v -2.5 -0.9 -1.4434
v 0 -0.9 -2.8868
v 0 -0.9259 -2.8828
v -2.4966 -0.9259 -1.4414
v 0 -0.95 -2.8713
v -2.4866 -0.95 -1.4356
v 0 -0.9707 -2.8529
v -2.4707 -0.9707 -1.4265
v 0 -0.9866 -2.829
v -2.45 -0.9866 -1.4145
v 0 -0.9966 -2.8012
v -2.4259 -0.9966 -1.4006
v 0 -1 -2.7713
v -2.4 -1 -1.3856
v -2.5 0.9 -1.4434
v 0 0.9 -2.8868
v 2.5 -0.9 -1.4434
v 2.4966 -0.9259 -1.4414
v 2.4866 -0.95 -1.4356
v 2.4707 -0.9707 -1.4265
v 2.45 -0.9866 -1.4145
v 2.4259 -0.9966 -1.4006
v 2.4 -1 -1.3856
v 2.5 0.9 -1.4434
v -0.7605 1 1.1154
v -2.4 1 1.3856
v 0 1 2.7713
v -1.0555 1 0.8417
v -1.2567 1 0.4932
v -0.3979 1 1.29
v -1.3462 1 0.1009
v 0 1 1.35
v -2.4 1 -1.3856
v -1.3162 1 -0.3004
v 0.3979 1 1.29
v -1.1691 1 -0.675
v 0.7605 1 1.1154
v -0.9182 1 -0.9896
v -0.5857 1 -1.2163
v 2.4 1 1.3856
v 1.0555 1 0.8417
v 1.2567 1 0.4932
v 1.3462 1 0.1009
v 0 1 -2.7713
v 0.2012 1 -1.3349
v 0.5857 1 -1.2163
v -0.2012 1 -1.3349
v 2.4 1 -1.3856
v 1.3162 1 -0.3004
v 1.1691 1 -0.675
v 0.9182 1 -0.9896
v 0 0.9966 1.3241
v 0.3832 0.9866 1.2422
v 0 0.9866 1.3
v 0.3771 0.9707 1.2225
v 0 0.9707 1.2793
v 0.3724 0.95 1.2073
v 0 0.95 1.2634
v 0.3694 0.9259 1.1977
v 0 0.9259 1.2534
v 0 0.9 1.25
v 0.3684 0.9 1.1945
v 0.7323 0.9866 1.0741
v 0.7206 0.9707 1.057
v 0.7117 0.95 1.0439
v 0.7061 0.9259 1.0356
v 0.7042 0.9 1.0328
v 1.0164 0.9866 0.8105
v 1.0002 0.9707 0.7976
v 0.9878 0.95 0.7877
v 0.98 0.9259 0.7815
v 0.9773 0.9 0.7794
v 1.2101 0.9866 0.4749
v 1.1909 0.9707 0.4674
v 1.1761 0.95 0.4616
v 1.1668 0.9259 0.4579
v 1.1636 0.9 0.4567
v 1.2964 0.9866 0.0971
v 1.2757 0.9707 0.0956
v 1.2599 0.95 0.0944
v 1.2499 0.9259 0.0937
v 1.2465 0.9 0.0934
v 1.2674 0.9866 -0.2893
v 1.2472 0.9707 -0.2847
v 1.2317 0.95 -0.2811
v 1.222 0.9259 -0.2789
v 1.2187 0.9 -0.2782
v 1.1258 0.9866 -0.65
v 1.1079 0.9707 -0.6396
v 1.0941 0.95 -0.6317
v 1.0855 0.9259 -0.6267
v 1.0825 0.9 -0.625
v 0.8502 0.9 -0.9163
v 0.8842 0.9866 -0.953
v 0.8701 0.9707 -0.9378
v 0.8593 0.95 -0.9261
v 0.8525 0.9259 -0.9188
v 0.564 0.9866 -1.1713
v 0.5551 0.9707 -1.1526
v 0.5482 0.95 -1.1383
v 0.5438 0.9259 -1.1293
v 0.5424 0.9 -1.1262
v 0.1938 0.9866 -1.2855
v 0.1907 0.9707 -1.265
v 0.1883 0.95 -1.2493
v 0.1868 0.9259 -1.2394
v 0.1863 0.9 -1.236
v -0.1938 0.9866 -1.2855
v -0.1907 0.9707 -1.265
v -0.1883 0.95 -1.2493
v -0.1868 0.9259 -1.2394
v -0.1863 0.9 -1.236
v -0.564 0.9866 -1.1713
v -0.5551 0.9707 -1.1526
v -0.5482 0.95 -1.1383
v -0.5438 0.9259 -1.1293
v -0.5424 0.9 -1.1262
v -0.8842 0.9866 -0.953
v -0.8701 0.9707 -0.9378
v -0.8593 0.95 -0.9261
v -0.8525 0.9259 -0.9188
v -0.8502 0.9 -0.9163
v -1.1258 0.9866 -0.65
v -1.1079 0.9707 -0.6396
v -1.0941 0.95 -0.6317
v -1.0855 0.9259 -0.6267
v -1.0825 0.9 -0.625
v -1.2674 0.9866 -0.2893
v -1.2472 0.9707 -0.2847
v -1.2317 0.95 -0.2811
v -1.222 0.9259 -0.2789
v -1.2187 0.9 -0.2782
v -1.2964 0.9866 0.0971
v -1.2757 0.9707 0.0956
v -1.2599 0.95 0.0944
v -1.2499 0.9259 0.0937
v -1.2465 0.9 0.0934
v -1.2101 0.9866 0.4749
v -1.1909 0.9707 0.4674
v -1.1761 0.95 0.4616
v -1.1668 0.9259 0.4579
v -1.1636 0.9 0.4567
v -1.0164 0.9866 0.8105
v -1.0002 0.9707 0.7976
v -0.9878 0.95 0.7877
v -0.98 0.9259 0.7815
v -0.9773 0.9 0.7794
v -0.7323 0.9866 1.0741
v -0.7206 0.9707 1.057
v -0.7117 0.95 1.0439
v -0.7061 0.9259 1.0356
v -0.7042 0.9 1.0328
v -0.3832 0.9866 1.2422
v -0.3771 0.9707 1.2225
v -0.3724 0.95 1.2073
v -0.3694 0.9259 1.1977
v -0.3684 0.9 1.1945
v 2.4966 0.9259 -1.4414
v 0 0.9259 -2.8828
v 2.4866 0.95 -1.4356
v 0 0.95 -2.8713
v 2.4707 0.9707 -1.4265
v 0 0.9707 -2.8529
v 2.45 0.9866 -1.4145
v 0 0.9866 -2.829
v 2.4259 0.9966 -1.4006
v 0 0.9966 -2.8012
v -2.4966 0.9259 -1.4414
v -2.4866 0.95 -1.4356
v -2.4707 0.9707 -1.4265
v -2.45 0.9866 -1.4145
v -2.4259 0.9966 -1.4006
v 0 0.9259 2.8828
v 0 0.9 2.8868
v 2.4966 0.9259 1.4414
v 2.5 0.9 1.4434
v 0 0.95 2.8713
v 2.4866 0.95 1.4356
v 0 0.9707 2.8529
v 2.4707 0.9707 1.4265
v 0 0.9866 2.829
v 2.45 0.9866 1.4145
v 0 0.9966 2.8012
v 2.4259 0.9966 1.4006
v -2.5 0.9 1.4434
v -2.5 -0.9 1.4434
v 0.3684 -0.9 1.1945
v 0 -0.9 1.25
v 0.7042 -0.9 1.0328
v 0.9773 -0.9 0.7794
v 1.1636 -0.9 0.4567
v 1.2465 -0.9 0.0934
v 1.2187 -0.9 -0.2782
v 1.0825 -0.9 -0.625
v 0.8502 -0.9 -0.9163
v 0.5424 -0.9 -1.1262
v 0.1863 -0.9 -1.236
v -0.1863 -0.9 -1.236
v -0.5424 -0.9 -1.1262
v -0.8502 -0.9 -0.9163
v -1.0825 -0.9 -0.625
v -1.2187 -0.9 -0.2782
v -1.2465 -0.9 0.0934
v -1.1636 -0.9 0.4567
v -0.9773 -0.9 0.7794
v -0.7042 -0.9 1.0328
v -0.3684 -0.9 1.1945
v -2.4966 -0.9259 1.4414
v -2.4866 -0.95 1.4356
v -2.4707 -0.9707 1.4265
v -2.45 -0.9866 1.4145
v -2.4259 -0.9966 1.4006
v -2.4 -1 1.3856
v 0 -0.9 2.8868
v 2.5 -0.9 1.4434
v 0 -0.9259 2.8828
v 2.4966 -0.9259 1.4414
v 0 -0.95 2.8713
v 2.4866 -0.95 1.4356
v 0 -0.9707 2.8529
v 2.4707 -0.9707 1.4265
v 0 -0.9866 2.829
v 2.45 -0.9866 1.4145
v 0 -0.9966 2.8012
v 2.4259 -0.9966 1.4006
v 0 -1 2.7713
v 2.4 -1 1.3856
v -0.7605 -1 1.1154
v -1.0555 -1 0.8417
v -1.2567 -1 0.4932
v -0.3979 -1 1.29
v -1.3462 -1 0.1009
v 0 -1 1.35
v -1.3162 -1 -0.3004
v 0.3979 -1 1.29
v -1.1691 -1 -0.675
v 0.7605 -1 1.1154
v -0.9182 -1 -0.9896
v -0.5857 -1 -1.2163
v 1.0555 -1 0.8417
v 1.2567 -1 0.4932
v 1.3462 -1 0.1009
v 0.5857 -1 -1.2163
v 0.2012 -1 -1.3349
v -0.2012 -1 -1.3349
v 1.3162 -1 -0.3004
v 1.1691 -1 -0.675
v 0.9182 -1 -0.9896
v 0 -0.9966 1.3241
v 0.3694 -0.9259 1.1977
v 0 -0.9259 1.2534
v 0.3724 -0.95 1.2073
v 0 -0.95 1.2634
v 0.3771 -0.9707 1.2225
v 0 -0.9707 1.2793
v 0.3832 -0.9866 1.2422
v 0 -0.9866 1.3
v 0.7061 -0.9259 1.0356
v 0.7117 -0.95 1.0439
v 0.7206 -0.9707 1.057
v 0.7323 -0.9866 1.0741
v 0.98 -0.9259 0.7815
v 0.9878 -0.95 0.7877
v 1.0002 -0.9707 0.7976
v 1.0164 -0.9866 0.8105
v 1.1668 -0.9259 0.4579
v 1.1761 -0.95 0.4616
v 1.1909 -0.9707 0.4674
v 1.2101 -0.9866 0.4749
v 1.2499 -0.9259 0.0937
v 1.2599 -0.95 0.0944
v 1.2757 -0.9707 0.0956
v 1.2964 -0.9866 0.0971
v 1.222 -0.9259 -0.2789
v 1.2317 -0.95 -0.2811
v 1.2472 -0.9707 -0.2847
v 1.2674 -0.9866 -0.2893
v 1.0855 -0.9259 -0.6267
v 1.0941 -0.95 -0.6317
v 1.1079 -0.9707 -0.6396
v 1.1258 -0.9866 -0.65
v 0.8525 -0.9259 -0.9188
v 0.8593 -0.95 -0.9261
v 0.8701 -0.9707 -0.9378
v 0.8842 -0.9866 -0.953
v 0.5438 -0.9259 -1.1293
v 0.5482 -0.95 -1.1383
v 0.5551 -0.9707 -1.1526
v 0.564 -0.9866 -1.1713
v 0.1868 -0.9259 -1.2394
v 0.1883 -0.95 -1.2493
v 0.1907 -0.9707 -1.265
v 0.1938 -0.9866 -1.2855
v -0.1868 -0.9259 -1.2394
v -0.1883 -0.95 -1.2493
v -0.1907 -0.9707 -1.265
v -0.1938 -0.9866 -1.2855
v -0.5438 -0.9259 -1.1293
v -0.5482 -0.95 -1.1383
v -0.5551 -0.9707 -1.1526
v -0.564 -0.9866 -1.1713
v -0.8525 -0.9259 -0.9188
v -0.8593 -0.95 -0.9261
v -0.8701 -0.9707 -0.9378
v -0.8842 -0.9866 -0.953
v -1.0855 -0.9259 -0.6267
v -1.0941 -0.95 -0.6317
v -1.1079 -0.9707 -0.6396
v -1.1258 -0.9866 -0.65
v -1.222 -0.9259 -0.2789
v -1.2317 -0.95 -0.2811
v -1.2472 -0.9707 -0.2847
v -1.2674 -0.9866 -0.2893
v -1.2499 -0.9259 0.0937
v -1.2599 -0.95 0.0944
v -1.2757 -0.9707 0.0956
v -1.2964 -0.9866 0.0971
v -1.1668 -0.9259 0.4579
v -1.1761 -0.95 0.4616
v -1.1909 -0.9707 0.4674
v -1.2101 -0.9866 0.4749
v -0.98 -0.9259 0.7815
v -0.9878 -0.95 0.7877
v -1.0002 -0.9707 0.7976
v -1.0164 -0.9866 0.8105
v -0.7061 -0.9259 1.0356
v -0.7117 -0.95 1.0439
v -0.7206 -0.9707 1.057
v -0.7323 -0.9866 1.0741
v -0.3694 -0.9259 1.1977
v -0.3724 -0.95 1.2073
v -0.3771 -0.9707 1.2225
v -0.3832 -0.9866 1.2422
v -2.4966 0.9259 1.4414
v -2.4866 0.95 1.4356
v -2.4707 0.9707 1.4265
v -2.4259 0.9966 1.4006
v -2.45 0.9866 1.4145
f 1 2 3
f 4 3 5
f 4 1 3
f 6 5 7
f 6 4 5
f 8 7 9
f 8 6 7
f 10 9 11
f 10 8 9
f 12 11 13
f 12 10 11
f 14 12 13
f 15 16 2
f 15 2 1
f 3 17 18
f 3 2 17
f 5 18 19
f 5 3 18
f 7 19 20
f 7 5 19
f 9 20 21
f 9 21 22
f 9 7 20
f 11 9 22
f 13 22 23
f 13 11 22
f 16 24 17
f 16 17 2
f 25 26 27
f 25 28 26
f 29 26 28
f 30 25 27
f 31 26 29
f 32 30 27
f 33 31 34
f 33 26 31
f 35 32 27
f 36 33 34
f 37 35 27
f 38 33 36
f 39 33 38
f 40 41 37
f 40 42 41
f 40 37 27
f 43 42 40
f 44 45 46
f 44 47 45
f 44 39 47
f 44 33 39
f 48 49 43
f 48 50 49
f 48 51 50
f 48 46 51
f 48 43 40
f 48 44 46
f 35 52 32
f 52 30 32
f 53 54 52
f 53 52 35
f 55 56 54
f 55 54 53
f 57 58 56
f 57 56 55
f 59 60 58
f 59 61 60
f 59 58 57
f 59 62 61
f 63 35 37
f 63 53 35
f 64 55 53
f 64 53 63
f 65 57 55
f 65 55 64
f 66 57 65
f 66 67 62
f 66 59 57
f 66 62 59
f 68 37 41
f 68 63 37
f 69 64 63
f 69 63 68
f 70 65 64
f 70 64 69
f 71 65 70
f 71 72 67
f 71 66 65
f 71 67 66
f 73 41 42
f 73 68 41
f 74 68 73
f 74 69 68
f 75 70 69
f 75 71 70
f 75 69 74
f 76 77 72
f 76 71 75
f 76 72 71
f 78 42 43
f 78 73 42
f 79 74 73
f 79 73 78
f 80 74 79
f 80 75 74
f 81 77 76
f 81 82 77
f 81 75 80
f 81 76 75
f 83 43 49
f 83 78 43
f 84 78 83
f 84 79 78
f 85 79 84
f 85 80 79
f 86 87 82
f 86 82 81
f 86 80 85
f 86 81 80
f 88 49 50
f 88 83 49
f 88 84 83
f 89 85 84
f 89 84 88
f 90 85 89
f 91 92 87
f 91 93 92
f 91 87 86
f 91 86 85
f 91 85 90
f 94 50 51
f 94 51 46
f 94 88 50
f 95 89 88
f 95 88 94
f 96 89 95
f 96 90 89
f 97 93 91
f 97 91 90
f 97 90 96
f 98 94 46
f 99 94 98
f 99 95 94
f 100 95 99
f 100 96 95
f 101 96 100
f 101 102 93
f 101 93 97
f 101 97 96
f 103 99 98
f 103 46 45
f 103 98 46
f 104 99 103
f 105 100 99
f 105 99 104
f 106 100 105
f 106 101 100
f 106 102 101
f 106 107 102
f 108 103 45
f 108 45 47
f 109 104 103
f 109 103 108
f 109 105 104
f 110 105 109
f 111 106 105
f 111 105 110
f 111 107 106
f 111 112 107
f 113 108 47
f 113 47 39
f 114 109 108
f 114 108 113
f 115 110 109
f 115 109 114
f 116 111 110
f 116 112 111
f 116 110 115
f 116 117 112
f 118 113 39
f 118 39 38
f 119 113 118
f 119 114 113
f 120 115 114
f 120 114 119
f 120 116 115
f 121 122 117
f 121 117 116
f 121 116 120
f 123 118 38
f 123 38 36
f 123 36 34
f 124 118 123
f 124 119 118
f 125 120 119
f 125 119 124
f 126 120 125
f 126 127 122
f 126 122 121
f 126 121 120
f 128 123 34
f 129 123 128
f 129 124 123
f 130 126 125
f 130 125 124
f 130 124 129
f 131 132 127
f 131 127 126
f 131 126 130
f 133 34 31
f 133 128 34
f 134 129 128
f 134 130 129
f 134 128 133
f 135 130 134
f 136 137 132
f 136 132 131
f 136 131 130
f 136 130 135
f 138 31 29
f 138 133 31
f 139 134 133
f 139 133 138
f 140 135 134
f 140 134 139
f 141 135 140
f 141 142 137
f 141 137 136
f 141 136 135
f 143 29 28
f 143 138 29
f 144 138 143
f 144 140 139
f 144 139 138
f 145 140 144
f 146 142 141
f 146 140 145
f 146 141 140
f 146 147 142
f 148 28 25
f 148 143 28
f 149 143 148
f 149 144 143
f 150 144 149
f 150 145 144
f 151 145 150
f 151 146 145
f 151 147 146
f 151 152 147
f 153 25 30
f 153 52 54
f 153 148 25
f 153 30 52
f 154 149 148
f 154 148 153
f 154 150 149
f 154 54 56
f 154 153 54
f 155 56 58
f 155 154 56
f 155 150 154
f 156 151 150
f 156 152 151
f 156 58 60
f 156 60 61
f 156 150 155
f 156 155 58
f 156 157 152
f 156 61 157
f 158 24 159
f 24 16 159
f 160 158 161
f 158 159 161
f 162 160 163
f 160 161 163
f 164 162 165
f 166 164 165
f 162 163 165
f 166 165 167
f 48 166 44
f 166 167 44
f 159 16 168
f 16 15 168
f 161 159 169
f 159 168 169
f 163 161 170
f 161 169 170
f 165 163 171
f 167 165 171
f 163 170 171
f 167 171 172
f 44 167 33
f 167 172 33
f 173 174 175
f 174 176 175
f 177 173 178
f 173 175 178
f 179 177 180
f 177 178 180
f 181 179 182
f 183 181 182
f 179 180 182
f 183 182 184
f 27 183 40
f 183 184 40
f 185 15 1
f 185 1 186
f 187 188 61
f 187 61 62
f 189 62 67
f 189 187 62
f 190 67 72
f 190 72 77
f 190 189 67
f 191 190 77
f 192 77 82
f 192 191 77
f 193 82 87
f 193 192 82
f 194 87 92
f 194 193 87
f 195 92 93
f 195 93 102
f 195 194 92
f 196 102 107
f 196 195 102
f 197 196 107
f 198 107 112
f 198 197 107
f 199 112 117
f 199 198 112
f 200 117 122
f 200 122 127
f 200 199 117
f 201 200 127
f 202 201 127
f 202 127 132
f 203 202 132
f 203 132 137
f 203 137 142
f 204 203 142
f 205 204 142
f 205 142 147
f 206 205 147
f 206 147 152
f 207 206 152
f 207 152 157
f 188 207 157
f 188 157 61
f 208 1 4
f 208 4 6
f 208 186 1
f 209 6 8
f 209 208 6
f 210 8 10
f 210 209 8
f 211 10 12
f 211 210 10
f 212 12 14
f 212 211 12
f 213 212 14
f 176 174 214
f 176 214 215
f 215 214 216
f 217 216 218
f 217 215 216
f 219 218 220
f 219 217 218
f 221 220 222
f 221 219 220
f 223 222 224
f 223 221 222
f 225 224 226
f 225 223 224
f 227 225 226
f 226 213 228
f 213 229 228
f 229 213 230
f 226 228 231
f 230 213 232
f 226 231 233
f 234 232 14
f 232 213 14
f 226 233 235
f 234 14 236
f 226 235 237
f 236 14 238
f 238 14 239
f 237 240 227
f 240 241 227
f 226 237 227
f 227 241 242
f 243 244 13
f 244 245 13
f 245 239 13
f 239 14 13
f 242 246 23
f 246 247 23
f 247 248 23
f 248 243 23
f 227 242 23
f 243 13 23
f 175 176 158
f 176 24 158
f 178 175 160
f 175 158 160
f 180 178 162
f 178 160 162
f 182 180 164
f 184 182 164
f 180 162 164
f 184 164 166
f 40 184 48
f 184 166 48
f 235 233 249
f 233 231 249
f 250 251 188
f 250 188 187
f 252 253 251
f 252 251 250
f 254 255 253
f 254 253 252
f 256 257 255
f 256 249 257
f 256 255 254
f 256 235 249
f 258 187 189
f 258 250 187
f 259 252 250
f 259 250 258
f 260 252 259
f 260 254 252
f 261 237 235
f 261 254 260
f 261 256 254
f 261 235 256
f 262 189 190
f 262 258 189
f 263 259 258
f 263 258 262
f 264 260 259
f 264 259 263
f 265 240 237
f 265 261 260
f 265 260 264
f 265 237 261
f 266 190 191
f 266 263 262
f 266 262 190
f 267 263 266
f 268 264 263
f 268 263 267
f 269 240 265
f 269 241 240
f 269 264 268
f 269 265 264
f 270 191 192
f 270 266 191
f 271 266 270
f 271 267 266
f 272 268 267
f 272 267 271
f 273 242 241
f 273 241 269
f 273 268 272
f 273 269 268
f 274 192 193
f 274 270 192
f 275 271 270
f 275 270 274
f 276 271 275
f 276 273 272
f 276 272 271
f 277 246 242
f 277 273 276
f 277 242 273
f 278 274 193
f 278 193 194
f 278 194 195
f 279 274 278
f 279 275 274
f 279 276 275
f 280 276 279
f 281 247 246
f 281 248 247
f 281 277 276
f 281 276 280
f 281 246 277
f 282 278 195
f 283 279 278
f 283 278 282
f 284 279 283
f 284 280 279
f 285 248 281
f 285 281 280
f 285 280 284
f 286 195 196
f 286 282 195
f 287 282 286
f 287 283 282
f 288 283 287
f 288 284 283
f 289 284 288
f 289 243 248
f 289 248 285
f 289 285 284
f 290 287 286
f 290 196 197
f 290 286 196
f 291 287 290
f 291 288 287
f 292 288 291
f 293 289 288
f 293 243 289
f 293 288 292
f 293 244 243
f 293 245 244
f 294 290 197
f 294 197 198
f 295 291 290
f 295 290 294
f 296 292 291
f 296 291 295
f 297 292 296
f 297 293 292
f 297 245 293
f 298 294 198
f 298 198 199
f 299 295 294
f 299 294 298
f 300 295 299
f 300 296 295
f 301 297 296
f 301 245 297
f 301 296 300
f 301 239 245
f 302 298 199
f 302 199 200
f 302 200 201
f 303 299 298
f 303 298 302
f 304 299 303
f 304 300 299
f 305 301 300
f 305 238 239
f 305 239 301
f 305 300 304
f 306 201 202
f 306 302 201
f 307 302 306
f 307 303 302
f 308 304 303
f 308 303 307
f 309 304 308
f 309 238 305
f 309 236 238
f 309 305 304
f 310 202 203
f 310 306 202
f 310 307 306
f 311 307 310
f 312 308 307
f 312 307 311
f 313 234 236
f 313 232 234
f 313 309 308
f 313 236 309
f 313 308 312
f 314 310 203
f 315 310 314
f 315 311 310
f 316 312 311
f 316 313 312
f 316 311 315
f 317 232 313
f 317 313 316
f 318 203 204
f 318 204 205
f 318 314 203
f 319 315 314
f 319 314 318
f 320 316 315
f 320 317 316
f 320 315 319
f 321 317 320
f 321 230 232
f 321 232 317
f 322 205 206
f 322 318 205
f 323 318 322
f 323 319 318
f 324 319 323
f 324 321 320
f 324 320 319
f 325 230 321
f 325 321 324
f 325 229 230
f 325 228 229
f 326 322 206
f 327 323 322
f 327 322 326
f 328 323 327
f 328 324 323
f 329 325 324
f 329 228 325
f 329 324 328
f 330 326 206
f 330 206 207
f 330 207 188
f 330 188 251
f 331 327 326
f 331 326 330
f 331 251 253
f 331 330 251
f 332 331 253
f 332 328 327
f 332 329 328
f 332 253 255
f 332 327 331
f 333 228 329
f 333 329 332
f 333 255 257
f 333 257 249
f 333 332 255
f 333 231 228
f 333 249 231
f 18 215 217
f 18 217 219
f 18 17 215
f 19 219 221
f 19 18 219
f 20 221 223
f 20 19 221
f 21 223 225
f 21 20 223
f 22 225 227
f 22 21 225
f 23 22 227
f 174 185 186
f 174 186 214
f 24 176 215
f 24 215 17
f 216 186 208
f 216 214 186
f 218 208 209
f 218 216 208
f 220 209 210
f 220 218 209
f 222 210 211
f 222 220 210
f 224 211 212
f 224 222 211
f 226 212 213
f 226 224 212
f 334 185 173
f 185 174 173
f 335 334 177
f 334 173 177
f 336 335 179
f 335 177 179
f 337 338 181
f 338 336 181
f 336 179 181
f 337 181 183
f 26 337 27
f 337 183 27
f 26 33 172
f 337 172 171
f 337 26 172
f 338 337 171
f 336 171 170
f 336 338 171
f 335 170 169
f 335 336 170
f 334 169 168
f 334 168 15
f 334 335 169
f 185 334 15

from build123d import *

# Parameters (mm, degrees)
SKETCH1_R           = 1.25
BOSS_EXTRUDE1_DEPTH = 1
FILLET1_R           = 0.1


with BuildPart() as part:
    # Sketch1 → Boss-Extrude1 (new, symmetric)
    with BuildSketch(Plane(origin=(0, 0, 0), x_dir=(1, 0, 0), z_dir=(0, 1, 0))):
        Polygon((0, 2.886751346), (-2.5, 1.443375673), (-2.5, -1.443375673), (0, -2.886751346), (2.5, -1.443375673), (2.5, 1.443375673), align=None)
        with Locations(Location((0, 0, 0), (0, 0, 270))):
            Circle(SKETCH1_R, mode=Mode.SUBTRACT)
    extrude(amount=BOSS_EXTRUDE1_DEPTH, both=True)

    # Fillet1
    fillet1_edges = [part.edges().sort_by_distance(p)[0] for p in [
        (-2.5, 1, 0),
        (-1.25, 1, 2.165063509),
        (1.25, 1, 2.165063509),
        (0, -1, -1.25),
        (0, 1, -1.25),
        (2.5, 1, 0),
        (1.25, 1, -2.165063509),
        (2.5, -1, 0),
        (1.25, -1, 2.165063509),
        (-1.25, -1, 2.165063509),
        (-1.25, 1, -2.165063509),
        (-2.5, -1, 0),
        (-1.25, -1, -2.165063509),
        (1.25, -1, -2.165063509),
    ]]
    fillet(fillet1_edges, radius=FILLET1_R)


solid = part.part
